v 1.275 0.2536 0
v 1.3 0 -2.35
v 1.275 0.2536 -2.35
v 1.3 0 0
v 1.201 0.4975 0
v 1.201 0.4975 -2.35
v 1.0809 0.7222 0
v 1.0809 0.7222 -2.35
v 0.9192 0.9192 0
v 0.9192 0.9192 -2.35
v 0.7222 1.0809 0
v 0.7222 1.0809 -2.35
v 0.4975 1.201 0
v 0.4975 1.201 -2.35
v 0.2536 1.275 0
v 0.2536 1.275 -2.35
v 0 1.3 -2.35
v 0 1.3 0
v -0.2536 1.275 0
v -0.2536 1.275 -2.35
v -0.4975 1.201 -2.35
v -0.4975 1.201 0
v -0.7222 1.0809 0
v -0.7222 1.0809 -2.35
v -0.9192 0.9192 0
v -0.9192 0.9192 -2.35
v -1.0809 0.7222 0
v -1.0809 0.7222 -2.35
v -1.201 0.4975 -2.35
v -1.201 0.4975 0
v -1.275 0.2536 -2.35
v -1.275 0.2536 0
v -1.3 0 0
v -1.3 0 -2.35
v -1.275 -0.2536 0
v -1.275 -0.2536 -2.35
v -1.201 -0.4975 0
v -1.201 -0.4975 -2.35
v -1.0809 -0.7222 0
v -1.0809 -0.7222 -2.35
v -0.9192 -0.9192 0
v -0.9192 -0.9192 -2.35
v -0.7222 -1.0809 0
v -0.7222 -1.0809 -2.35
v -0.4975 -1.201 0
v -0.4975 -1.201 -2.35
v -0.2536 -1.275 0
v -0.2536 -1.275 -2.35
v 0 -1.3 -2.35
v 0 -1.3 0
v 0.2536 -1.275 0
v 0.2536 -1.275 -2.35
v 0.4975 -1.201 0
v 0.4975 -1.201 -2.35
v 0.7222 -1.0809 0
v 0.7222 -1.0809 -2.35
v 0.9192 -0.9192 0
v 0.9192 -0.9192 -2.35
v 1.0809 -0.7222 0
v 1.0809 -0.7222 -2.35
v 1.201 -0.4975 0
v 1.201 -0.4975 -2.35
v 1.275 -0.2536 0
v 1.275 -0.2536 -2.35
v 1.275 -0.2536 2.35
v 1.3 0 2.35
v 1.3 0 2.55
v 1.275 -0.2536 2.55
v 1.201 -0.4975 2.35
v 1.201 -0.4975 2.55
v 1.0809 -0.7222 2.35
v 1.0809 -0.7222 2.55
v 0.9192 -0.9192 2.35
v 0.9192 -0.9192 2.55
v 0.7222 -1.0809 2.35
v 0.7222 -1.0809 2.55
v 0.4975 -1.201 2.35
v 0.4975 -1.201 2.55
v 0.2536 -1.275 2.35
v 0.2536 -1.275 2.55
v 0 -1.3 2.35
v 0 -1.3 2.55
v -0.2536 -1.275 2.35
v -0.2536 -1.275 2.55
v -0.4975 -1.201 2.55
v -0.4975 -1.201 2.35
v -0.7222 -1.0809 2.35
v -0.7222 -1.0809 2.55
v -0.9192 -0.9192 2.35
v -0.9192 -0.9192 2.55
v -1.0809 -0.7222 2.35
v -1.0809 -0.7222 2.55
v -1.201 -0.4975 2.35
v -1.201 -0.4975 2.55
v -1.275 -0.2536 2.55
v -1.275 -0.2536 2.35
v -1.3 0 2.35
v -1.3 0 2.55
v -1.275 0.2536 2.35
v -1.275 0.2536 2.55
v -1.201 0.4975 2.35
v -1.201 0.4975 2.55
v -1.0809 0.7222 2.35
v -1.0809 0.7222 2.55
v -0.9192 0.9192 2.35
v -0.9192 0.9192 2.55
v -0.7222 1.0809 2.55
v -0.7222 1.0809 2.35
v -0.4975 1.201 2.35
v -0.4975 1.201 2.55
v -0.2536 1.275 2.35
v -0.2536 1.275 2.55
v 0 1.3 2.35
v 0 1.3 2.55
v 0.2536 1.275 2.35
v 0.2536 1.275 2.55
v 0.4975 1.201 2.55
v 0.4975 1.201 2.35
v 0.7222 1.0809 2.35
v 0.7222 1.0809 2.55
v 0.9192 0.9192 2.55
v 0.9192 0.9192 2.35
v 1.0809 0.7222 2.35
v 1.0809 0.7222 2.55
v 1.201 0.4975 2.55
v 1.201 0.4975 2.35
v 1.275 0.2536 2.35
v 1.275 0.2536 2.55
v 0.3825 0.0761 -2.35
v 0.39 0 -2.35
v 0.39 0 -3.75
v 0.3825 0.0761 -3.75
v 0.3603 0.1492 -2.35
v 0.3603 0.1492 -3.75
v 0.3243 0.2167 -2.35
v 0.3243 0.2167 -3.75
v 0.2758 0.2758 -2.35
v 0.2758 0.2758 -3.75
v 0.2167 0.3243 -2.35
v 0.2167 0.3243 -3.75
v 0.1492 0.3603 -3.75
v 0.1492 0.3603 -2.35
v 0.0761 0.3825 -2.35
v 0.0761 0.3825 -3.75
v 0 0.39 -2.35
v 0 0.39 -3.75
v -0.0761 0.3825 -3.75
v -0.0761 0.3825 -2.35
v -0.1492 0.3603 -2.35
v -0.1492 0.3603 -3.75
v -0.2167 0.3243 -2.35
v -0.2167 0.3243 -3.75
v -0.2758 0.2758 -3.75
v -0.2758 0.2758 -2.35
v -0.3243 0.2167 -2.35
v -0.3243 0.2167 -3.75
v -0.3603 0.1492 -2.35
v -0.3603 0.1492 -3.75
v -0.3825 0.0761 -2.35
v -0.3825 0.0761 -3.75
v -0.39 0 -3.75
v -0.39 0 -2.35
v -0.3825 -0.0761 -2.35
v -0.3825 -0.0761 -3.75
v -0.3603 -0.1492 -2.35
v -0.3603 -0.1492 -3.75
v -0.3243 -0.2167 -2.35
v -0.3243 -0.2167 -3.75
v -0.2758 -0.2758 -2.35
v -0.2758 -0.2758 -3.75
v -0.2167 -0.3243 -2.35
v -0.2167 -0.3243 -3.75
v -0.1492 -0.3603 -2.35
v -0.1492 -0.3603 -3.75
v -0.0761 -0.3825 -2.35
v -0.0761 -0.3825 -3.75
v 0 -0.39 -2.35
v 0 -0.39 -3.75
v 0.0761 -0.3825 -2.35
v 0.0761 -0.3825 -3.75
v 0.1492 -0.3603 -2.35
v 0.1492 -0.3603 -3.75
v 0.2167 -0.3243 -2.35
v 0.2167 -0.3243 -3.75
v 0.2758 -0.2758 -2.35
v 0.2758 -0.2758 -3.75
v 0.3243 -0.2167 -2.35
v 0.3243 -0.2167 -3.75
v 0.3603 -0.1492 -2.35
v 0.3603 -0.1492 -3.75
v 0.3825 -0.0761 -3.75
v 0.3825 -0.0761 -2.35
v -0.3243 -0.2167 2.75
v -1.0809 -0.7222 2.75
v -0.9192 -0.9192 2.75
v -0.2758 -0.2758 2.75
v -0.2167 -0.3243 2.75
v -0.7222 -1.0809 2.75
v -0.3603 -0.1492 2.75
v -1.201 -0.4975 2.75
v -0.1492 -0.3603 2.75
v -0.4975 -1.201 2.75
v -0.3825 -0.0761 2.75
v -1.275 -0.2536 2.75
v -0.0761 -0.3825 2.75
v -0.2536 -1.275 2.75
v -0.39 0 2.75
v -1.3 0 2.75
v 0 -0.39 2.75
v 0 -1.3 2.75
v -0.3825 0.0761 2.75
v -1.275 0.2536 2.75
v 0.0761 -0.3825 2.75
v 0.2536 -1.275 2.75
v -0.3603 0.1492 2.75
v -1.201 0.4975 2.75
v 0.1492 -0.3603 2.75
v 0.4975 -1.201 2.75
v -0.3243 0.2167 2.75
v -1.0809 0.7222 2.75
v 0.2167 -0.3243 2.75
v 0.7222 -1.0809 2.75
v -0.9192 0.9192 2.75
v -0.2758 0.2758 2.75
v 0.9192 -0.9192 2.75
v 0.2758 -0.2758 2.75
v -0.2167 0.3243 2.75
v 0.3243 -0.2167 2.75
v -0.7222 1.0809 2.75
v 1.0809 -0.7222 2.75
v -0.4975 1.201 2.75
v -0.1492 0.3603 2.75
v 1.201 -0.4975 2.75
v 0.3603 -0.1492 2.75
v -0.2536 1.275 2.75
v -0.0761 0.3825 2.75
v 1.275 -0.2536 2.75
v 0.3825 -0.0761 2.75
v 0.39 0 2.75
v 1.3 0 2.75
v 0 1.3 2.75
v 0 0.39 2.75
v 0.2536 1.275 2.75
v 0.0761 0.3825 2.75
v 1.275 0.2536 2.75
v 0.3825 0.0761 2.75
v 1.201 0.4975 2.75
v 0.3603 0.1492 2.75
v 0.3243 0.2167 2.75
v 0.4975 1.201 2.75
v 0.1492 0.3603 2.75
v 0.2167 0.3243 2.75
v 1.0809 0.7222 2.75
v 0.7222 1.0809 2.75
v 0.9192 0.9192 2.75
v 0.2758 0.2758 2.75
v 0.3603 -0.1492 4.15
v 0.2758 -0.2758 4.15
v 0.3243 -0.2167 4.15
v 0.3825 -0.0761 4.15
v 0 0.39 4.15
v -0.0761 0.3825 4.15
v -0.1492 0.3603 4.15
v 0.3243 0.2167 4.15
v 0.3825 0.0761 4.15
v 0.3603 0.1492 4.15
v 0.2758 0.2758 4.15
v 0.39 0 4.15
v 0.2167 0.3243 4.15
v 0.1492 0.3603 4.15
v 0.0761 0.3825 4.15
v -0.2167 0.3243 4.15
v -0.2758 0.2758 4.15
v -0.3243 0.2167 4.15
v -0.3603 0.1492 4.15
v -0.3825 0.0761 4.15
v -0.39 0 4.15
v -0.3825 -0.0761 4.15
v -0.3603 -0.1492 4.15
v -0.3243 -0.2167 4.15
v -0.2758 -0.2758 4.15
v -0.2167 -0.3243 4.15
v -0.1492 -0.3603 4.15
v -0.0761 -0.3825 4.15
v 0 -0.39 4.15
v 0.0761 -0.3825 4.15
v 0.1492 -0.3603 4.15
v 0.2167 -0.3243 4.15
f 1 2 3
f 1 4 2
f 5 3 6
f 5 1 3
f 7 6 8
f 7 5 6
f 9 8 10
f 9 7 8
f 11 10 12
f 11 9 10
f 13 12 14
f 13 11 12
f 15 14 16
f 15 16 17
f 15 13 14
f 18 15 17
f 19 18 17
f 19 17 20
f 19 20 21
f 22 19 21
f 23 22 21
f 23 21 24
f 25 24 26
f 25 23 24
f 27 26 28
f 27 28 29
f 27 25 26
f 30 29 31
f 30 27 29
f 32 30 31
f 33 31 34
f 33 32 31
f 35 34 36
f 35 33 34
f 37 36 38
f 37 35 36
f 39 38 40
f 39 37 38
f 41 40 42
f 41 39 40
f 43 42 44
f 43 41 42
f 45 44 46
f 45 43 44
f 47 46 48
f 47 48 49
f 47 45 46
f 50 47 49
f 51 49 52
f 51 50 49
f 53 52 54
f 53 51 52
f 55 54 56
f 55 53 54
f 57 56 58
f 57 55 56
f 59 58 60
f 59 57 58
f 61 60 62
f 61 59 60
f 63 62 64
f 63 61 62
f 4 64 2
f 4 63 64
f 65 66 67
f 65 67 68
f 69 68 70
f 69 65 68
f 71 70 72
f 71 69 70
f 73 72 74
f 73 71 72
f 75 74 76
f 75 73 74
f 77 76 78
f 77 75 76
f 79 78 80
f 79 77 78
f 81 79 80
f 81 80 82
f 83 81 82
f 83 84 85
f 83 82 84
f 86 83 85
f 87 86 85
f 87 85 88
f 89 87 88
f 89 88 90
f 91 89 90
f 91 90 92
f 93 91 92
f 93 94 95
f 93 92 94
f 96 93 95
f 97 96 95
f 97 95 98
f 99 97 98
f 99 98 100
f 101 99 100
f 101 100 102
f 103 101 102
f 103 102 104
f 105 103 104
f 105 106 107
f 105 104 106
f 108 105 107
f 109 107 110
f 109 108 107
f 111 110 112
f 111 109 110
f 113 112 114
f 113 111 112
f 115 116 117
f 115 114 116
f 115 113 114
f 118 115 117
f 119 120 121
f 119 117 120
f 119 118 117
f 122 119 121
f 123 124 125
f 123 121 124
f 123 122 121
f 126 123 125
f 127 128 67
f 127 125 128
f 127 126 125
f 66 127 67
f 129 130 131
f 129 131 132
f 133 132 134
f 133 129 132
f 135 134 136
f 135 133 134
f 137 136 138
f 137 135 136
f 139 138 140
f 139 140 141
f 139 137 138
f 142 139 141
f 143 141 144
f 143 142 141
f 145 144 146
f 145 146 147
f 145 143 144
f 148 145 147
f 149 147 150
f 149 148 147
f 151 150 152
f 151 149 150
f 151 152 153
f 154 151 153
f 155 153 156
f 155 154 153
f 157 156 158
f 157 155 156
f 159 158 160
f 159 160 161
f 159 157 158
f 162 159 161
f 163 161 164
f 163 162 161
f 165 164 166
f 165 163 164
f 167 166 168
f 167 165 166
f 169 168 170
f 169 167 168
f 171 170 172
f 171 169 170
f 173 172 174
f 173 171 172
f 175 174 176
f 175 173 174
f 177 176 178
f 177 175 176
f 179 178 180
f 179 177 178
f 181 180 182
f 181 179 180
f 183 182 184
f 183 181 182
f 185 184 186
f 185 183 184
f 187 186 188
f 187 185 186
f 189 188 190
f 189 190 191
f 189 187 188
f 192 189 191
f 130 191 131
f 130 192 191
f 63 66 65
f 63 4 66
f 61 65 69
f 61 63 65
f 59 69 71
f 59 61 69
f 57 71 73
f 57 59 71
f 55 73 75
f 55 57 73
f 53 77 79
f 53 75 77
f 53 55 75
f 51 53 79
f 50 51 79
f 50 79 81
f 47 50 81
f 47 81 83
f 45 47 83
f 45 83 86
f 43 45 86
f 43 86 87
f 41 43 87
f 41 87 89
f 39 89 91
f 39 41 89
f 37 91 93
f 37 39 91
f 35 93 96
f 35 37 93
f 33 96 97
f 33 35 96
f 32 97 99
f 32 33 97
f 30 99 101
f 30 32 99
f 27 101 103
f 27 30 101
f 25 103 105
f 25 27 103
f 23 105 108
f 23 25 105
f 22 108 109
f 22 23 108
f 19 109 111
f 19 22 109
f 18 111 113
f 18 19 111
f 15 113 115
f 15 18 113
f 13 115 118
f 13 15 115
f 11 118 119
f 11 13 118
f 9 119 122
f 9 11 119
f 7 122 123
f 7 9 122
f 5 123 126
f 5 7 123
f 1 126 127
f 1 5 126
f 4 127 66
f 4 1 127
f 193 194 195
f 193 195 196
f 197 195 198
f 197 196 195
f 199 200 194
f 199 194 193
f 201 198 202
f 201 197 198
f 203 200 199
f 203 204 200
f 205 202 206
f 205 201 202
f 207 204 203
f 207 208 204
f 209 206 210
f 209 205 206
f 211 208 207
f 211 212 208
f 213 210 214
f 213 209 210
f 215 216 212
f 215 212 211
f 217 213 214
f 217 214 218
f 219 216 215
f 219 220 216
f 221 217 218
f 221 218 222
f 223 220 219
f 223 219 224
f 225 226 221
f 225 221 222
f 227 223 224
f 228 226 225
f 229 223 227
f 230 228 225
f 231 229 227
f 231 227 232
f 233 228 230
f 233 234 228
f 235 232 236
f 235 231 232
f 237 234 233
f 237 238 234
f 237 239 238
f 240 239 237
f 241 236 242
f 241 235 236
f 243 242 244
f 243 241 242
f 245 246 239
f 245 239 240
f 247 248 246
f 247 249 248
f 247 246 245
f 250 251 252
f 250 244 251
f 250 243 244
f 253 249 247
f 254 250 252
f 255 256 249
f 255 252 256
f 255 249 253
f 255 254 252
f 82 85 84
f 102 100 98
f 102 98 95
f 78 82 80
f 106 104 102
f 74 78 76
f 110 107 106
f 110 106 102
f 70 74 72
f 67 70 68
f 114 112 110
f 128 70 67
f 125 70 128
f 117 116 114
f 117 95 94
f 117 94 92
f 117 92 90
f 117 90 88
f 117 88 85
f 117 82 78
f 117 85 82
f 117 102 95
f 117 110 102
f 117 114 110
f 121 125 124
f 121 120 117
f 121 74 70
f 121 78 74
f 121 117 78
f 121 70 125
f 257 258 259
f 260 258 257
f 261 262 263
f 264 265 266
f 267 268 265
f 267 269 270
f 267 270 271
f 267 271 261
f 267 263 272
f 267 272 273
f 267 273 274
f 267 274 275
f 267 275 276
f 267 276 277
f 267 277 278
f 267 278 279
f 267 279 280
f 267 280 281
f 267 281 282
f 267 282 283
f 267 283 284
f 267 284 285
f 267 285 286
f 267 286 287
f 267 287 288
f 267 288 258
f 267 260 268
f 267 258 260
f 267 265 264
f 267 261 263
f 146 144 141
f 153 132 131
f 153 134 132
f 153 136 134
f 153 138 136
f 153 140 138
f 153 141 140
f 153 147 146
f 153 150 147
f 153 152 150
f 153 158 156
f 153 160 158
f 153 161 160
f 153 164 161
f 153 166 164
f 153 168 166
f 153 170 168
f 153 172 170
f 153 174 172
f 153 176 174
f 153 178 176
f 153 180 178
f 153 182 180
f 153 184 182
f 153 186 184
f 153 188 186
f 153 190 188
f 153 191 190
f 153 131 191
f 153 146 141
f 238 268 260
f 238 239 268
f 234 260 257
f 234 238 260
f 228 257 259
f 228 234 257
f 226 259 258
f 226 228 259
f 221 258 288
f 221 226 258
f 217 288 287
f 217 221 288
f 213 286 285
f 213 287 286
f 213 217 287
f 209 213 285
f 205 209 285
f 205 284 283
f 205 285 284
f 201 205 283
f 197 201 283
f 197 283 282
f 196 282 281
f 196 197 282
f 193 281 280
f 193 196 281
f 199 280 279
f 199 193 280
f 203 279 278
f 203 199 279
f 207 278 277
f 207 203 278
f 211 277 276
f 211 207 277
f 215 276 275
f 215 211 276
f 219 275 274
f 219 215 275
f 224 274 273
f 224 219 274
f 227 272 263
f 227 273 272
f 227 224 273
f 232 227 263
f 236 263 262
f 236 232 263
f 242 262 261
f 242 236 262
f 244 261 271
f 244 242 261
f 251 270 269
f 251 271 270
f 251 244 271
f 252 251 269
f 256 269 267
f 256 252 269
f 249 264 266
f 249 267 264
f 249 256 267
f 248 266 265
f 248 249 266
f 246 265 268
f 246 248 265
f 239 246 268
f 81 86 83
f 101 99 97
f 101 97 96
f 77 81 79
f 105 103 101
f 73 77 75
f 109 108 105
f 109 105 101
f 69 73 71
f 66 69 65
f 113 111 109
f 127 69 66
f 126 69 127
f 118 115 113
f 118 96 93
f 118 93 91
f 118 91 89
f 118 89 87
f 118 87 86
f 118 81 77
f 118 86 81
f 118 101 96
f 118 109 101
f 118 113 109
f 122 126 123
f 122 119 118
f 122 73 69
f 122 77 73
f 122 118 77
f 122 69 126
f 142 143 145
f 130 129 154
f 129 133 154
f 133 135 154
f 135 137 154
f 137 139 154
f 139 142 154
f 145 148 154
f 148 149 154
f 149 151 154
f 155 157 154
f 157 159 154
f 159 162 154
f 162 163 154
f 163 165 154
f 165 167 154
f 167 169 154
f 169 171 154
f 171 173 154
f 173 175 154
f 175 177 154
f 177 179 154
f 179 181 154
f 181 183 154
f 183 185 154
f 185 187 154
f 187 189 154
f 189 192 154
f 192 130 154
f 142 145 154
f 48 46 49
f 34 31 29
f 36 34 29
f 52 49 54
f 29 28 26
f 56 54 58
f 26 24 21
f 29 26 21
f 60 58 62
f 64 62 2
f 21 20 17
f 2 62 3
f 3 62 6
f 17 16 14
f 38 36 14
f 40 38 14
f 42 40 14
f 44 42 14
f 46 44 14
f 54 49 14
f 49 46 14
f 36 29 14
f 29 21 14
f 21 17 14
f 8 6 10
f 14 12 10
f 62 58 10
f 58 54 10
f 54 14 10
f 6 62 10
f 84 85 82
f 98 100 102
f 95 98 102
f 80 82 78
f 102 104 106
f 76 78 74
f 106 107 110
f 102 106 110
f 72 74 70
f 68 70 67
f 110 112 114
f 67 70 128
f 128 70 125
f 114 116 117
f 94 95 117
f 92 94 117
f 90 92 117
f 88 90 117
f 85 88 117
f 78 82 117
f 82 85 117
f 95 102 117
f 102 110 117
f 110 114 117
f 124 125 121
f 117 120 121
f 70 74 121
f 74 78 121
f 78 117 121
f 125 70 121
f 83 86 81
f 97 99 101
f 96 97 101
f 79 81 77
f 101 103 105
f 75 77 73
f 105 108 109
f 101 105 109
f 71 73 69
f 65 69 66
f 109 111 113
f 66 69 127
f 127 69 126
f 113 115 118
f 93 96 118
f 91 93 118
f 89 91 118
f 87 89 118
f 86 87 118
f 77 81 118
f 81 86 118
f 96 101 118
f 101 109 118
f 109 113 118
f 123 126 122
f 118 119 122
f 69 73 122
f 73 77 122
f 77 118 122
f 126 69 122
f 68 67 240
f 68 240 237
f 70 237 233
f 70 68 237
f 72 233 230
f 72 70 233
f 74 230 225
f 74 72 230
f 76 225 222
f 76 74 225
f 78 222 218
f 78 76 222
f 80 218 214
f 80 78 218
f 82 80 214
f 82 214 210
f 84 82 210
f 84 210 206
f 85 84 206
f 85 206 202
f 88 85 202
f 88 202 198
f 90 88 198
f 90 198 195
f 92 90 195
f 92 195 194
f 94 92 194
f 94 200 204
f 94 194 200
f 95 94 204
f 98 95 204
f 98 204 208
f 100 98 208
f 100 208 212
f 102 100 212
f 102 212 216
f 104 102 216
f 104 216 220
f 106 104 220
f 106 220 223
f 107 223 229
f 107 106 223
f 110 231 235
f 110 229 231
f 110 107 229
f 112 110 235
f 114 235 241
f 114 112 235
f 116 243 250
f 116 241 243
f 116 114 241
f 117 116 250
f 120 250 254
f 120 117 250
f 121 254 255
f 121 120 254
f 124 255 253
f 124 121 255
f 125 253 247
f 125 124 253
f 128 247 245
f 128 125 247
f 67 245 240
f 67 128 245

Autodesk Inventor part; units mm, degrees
ref_plane "YZ Plane" through (0, 0, 0) normal (1, 0, 0) x (0, 1, 0)
ref_plane "XZ Plane" through (0, 0, 0) normal (0, 1, 0) x (-1, 0, 0)
sketch "Skizze1" plane through (0, 0, 0) normal (0, 0, 1) x (1, 0, 0)
  circle A0 centre (0, 0) radius 1.3
  dimension "d0" = 2.6
extrude "Extrusion1" add sketch "Skizze1" along normal mid plane 4.7
sketch "Skizze4" plane through (0, 0, 2.35) normal (0, 0, 1) x (1, 0, 0)
  circle A0 centre (0, 0) radius 1.3
extrude "Extrusion4" add sketch "Skizze4" along normal blind 0.2 separate body
sketch "Skizze5" plane through (0, 0, 2.55) normal (0, 0, 1) x (1, 0, 0)
  circle A0 centre (0, 0) radius 1.3
extrude "Extrusion5" add sketch "Skizze5" along normal blind 0.2 separate body
sketch "Skizze6" plane through (0, 0, 2.75) normal (0, 0, 1) x (1, 0, 0)
  circle A0 centre (0, 0) radius 0.39
  dimension "d13" = 0.78
extrude "Extrusion6" add sketch "Skizze6" along normal blind 1.4 bodies 3
ref_plane "Arbeitsebene1" through (0, 0, 0.2) normal (0, 0, 1) x (1, 0, 0)
mirror "Spiegeln1" about plane through (0, 0, 0.2) normal (0, 0, 1) of "Extrusion6" bodies 3
ref_plane "Arbeitsebene2" through (0, 0, 0.2) normal (0, 0, 1) x (1, 0, 0)
properties part number "1N4007"
